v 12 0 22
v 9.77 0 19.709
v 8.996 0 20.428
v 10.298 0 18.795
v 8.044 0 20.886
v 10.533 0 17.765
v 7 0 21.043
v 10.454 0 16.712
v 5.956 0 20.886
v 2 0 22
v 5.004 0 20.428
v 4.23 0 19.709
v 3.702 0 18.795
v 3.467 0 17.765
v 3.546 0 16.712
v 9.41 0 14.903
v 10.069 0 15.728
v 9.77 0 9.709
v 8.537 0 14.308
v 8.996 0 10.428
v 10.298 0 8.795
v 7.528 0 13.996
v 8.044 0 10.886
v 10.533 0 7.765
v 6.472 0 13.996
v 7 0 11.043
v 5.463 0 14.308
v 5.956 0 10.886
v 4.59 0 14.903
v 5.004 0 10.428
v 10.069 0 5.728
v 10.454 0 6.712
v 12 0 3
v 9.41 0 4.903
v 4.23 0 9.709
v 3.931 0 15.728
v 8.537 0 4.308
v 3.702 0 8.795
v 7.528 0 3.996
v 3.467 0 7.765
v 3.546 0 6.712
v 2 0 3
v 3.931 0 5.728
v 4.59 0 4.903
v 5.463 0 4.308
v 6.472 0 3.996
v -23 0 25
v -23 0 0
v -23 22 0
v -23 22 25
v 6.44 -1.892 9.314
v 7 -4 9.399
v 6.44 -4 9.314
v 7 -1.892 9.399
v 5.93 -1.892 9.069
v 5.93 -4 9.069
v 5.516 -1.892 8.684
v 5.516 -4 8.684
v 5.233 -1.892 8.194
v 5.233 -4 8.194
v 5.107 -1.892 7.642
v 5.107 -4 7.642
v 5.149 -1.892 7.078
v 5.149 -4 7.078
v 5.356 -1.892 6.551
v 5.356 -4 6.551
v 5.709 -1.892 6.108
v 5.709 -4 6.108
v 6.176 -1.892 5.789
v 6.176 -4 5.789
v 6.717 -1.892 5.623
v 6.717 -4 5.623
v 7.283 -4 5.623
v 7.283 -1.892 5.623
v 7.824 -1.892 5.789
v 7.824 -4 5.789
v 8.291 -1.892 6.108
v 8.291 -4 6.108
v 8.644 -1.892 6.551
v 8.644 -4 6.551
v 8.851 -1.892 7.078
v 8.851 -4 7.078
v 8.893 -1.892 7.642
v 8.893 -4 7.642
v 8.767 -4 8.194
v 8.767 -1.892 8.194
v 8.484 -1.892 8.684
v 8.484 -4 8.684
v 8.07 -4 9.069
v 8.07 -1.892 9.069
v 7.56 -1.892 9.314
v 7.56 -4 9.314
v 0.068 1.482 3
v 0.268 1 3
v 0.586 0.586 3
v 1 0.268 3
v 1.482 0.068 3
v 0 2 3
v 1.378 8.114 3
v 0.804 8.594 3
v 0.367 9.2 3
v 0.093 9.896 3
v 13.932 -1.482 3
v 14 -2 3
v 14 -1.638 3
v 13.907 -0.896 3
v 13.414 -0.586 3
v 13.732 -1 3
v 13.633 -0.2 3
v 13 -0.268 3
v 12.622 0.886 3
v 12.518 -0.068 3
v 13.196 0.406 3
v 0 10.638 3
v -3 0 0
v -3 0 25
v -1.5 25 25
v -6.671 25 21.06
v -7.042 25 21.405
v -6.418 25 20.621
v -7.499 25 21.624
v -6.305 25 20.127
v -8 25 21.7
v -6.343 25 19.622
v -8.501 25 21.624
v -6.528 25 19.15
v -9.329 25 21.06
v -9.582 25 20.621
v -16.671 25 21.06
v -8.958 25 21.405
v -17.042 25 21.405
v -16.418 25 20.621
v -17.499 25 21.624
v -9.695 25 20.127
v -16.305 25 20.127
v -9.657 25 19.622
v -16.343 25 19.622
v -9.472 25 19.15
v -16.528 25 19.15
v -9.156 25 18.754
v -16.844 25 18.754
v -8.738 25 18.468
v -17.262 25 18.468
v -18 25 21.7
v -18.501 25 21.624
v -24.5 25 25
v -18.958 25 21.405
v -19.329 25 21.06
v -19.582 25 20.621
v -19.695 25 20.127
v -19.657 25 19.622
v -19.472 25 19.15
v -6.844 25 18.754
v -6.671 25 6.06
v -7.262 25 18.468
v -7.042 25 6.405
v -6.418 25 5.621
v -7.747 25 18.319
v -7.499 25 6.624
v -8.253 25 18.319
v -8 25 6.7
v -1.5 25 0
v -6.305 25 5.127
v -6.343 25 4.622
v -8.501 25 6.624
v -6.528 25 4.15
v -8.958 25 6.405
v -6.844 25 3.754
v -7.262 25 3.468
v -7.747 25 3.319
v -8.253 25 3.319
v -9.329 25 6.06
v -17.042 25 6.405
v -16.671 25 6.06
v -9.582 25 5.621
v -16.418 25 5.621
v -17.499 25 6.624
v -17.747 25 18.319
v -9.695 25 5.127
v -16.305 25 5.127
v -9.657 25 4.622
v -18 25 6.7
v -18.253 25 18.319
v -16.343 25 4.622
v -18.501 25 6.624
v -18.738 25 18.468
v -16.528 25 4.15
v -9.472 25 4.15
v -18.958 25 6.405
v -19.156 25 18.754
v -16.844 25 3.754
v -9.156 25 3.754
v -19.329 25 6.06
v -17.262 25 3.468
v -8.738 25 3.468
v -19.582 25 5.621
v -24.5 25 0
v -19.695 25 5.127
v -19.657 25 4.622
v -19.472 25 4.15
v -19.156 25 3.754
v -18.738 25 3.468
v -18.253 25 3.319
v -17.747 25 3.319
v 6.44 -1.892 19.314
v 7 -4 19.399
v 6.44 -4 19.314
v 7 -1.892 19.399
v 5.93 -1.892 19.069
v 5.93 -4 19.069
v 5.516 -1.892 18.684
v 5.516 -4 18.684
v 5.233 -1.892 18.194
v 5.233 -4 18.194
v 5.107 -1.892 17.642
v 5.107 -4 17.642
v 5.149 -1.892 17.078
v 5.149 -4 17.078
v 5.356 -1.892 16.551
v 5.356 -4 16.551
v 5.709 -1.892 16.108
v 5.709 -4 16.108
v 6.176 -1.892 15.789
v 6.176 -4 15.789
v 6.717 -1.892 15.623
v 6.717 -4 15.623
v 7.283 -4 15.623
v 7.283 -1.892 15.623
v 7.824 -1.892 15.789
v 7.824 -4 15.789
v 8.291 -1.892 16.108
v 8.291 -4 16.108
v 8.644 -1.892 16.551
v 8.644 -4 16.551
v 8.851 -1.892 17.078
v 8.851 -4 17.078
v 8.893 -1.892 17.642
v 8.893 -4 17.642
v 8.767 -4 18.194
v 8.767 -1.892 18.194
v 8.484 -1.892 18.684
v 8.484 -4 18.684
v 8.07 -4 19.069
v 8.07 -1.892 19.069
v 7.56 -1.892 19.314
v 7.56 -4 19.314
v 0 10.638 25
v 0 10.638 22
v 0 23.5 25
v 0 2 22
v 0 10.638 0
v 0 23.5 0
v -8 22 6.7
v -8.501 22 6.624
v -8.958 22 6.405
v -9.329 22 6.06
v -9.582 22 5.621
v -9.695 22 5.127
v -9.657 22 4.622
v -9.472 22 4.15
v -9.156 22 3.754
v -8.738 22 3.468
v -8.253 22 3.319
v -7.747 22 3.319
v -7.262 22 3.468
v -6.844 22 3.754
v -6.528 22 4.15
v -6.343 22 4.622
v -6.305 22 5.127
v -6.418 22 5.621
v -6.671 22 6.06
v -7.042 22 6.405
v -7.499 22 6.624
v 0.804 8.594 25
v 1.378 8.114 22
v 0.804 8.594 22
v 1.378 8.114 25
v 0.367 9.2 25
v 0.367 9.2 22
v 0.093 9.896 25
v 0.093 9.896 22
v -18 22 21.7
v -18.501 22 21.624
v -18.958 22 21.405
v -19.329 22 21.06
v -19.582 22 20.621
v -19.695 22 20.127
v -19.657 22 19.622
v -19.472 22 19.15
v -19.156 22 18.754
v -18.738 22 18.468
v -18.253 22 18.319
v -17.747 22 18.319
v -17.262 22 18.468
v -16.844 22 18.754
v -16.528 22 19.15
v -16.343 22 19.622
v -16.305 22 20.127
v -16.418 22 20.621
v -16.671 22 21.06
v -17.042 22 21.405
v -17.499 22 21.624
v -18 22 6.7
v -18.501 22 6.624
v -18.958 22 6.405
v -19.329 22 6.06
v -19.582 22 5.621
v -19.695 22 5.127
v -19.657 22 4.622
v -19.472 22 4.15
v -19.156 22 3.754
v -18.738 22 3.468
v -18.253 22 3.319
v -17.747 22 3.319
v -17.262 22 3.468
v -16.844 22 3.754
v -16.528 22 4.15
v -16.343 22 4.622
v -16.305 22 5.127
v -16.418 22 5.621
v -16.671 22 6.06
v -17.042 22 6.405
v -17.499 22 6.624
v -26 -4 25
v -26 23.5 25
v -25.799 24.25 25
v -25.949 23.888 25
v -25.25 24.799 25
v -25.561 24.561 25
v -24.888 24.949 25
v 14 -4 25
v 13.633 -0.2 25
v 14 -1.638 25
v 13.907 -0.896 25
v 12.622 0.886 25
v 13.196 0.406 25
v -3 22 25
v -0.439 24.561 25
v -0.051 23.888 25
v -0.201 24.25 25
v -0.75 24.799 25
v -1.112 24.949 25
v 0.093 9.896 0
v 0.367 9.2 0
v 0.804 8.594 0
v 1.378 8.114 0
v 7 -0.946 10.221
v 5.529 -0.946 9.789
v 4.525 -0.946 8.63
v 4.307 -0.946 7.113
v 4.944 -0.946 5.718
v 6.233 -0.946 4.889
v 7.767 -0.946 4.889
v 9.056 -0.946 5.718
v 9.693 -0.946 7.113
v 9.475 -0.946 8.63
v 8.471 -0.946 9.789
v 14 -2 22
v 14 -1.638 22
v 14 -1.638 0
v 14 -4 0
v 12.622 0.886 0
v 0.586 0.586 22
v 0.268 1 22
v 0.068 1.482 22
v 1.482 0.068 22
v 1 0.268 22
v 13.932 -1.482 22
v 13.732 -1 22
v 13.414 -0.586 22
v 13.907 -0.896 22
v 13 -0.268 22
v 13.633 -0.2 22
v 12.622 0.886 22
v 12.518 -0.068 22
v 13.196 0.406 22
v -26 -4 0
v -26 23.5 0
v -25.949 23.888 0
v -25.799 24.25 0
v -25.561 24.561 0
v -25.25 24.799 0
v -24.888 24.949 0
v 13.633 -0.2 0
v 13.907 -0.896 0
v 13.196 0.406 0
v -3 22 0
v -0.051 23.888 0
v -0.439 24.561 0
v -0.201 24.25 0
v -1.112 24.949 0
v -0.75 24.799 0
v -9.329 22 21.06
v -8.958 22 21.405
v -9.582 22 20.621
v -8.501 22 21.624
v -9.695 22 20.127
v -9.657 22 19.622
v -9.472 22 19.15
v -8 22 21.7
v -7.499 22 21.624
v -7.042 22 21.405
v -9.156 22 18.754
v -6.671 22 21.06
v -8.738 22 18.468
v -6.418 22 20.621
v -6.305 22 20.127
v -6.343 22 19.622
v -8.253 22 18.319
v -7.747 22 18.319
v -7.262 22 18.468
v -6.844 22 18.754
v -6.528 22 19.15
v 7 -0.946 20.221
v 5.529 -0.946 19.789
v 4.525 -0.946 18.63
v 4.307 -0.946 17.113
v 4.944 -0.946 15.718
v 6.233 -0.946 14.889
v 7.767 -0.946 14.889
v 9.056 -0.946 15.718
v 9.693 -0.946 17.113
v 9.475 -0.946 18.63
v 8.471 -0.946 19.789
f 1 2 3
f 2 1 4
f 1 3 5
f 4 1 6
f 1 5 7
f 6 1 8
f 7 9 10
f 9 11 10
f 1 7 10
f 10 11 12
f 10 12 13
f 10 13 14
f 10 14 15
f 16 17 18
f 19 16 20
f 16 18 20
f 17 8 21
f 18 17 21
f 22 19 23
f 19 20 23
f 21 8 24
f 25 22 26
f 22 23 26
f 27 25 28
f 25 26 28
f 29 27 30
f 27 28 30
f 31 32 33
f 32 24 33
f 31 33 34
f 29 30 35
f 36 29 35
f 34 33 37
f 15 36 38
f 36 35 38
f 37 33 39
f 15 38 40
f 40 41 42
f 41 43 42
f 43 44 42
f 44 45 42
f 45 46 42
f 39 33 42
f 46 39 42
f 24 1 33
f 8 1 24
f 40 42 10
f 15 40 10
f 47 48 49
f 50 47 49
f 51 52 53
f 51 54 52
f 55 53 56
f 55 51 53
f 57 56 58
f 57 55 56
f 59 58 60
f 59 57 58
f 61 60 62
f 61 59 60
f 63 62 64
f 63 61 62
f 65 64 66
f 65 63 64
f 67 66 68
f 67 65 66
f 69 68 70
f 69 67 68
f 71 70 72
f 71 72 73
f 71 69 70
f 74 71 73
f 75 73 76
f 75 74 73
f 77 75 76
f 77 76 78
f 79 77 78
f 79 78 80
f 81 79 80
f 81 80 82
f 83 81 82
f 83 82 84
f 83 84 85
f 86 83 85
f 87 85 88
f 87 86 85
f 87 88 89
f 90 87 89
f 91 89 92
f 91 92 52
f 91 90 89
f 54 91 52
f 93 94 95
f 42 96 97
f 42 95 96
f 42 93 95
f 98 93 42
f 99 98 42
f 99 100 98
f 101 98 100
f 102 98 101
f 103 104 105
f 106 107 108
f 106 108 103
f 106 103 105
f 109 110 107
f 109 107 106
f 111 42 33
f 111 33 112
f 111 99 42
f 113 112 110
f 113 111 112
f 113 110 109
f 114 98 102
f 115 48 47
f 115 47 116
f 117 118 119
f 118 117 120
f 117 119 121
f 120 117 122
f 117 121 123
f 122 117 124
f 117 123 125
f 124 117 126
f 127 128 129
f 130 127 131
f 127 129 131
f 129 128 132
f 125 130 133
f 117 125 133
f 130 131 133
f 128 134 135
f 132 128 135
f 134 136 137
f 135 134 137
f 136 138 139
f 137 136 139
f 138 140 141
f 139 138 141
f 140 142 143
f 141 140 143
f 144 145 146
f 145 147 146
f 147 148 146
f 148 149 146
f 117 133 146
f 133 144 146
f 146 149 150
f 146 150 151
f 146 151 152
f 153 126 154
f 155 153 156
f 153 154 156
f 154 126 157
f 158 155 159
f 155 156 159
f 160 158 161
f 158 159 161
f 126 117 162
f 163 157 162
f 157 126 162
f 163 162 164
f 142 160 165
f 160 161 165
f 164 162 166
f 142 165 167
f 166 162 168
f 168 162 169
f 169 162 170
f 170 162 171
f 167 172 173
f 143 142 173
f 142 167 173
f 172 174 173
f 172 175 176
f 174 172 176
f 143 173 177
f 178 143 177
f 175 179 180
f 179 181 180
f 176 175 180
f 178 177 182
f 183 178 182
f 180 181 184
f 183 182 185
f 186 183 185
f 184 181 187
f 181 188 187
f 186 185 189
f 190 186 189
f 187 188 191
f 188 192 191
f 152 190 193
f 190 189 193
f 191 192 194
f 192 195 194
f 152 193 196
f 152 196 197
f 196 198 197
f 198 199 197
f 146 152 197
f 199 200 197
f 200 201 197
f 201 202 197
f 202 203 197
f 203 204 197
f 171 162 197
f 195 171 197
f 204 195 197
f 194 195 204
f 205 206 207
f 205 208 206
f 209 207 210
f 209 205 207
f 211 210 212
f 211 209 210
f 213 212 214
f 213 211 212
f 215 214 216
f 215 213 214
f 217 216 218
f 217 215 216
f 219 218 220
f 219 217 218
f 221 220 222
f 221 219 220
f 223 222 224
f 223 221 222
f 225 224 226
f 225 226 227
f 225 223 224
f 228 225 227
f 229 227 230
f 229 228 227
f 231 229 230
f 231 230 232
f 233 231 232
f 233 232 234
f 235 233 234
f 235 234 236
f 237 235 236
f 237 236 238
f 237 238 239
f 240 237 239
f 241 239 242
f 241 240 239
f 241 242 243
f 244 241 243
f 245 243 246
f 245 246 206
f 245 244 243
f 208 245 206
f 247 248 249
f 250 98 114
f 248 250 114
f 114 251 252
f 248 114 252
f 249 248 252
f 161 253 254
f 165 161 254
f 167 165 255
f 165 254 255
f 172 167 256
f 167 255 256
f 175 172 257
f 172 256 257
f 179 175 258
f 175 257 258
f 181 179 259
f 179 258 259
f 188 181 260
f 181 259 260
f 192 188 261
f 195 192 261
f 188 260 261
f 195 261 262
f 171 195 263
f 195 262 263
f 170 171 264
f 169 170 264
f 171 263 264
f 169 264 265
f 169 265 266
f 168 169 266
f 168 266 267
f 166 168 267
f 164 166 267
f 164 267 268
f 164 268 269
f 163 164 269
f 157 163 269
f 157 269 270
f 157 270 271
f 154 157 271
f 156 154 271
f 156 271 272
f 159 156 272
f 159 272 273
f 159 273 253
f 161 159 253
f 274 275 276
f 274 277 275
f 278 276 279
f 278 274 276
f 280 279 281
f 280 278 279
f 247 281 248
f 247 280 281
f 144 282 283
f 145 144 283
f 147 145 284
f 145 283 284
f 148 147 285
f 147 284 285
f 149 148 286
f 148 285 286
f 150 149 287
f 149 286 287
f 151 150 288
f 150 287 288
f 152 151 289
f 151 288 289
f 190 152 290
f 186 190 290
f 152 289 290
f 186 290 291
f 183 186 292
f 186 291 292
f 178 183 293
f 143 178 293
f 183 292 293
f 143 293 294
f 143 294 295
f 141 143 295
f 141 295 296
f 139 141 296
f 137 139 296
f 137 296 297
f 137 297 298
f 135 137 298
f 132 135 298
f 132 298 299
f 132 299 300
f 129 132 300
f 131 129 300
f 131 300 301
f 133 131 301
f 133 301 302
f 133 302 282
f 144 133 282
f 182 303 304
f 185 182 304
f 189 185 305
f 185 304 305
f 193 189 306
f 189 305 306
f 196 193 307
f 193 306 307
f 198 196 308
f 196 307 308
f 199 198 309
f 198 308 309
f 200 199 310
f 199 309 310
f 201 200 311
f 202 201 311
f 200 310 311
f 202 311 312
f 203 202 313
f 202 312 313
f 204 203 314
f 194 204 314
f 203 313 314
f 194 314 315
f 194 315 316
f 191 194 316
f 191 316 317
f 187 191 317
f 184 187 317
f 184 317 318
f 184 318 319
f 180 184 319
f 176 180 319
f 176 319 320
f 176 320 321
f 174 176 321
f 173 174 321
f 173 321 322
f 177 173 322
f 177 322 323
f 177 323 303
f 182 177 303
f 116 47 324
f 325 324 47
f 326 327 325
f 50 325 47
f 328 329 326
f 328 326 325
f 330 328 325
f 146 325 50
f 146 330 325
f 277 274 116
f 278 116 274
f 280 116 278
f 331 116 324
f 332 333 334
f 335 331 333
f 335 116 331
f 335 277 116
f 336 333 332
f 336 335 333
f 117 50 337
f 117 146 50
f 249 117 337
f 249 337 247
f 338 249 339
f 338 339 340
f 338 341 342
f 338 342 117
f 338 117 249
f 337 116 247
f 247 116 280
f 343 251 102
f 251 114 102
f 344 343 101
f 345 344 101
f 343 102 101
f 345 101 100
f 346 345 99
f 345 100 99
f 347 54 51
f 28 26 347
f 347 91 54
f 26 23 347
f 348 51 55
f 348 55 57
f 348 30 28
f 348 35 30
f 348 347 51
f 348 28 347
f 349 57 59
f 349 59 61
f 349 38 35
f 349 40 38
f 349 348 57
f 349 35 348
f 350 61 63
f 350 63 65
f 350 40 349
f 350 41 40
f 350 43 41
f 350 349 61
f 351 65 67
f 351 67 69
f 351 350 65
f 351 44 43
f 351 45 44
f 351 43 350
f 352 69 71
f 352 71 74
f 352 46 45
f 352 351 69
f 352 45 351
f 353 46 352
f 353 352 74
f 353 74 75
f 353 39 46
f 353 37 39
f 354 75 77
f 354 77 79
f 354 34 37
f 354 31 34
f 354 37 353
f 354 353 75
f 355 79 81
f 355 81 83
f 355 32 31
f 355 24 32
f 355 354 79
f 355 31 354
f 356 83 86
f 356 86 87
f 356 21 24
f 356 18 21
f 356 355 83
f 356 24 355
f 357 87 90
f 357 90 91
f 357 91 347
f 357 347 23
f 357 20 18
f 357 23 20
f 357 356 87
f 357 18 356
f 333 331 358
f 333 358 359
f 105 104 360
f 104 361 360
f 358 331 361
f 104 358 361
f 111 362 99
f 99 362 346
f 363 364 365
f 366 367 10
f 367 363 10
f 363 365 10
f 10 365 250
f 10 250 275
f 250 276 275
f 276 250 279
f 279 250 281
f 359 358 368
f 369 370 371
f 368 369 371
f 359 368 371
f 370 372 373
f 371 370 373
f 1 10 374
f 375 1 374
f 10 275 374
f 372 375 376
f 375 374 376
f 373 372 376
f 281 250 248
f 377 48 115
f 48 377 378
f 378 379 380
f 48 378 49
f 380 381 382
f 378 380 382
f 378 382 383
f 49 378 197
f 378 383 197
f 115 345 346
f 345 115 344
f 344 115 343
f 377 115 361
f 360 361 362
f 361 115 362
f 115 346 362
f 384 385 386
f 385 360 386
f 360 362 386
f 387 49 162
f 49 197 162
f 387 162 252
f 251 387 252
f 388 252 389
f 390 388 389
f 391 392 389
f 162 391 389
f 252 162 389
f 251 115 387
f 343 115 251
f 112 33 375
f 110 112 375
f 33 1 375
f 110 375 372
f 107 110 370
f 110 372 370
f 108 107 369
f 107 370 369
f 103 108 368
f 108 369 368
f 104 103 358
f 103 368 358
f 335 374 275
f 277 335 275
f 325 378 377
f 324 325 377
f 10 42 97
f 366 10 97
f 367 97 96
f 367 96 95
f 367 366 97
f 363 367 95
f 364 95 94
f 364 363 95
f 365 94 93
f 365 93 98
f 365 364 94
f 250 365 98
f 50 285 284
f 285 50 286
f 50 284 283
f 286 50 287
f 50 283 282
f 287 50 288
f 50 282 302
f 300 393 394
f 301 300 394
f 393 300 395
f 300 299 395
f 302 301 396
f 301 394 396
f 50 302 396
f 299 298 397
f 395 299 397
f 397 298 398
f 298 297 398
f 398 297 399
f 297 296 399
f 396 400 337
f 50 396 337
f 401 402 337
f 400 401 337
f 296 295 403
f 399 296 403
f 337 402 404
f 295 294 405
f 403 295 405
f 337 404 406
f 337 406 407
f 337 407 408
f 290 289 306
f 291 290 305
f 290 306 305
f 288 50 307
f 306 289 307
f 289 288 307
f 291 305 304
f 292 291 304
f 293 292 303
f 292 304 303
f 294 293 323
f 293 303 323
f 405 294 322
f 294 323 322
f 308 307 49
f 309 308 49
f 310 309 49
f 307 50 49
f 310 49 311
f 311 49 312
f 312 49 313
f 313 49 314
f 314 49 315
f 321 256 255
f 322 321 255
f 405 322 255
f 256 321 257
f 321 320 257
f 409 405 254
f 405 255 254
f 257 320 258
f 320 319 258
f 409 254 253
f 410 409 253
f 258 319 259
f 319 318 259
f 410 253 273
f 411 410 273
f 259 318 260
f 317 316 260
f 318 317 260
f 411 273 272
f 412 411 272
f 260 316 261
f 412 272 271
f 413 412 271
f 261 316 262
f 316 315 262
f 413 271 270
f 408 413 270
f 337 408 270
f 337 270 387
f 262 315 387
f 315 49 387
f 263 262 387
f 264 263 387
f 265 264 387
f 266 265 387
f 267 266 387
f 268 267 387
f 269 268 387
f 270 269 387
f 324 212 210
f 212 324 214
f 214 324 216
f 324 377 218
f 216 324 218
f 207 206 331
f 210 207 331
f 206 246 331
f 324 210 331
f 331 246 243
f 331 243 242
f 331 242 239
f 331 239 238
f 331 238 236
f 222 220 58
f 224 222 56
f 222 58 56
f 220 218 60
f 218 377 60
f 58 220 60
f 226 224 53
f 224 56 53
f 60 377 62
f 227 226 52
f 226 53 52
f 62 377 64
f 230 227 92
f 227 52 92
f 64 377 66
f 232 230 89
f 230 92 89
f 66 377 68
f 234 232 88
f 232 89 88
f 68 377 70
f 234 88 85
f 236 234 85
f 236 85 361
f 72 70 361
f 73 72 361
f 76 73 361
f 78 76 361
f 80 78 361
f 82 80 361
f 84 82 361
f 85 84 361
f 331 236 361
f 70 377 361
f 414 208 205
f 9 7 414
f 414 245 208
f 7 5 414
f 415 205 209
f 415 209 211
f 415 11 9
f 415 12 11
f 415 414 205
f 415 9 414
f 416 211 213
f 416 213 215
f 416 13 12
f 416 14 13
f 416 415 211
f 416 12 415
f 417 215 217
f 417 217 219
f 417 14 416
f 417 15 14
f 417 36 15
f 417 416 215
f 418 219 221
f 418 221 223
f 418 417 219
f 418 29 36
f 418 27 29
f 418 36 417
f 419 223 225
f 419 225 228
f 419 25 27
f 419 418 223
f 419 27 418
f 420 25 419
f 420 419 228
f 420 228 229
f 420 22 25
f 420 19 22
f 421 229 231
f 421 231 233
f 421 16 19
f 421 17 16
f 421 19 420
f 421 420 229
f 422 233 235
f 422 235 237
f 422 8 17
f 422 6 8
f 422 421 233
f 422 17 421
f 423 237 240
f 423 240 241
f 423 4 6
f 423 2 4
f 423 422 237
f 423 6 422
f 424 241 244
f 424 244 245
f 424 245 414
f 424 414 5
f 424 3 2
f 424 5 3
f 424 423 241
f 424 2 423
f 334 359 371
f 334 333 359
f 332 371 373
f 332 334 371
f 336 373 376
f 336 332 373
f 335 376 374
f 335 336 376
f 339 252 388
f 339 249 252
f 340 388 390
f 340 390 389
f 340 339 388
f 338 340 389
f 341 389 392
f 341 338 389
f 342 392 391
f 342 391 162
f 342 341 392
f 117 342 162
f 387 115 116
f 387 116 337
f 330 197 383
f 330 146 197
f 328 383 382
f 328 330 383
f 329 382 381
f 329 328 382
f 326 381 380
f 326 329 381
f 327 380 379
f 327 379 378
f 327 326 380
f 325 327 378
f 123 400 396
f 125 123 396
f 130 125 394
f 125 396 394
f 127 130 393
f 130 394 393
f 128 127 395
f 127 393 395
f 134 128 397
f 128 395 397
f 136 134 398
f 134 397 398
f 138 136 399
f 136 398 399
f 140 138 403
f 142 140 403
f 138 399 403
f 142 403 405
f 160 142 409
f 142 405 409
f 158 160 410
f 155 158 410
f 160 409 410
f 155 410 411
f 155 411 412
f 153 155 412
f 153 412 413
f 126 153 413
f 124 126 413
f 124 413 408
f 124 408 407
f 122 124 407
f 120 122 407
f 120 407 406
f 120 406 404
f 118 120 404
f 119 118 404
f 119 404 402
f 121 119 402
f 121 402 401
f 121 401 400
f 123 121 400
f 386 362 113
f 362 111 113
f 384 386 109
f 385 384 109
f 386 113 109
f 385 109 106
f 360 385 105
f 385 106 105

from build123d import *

# Parameters (mm, degrees)
PROFILE_SKETCH_W               = 20
PROFILE_SKETCH_H               = 22
PROFILE_EXTRUDE_DEPTH          = 25
GUSSET_1_EXTRUDE_DEPTH         = 3
GUSSET_START                   = 22
GUSSET_2_EXTRUDE_DEPTH         = 3
SOLENOID_MOUNTING_HOLES_D      = 3.4
SOLENOID_MOUNTING_HOLES_DEPTH  = 3
NO_6_MOUNTING_HOLES_AT_2_COUNT = 2
NO_6_MOUNTING_HOLES_AT_2_PITCH = 10
FILLET3_R                      = 3
FILLET4_R                      = 2
FILLET5_R                      = 3
FILLET6_R                      = 1.5


with BuildPart() as part:
    # Profile Sketch → Profile  Extrude (new body)
    with BuildSketch(Plane.XY):
        Polygon((0, 0), (0, 25), (-26, 25), (-26, -4), (14, -4), (14, 0), align=None)
        with Locations((-13, 11)):
            Rectangle(PROFILE_SKETCH_W, PROFILE_SKETCH_H, mode=Mode.SUBTRACT)
    extrude(amount=PROFILE_EXTRUDE_DEPTH)

    # Gusset Sketch → Gusset 1 Extrude (add)
    with BuildSketch(Plane.XY):
        Polygon((0, 0), (14, 0), (0, 9), align=None)
    extrude(amount=GUSSET_1_EXTRUDE_DEPTH)

    # Gusset Sketch<2> → Gusset 2 Extrude (add)
    with BuildSketch(Plane.XY.offset(GUSSET_START)):
        Polygon((0, 0), (14, 0), (0, 9), align=None)
    extrude(amount=GUSSET_2_EXTRUDE_DEPTH)

    # Solenoid Mounting Holes
    with Locations(Plane(origin=(-25, 25, 0), x_dir=(0, 0, -1), z_dir=(0, 1, 0))):
        with Locations((-5, -17), (-20, -17), (-20, -7), (-5, -7)):
            Hole(SOLENOID_MOUNTING_HOLES_D / 2, depth=SOLENOID_MOUNTING_HOLES_DEPTH)

    # No. 6 Mounting Holes Profile Sketch → No. 6 Mounting Holes (revolve, cut)
    with BuildSketch(Plane(origin=(7, 0, 17.5), x_dir=(0, 0, 1), z_dir=(1, 0, 0))):
        Polygon((0, 0), (0, 4), (1.89865, 4), (1.89865, 1.891953401), (3.5433, 0), align=None)
    no_6_mounting_holes = revolve(axis=Axis((7, 6.35, 17.5), (0, -1, 0)), mode=Mode.SUBTRACT)

    # No. 6 Mounting Holes at 2: No. 6 Mounting Holes ×2
    with Locations(*[(0, 0, -i * NO_6_MOUNTING_HOLES_AT_2_PITCH) for i in range(1, NO_6_MOUNTING_HOLES_AT_2_COUNT)]):
        add(no_6_mounting_holes, mode=Mode.SUBTRACT)

    # Fillet3
    fillet3_edges = [part.edges().sort_by_distance(p)[0] for p in [
        (0, 9, 1.5),
        (0, 9, 23.5),
    ]]
    fillet(fillet3_edges, radius=FILLET3_R)

    # Fillet4
    fillet4_edges = [part.edges().sort_by_distance(p)[0] for p in [
        (14, 0, 12.5),
        (0, 0, 12.5),
    ]]
    fillet(fillet4_edges, radius=FILLET4_R)

    # Fillet5
    fillet5_edges = [part.edges().sort_by_distance(p)[0] for p in [
        (14, 0, 23.5),
        (14, 0, 1.5),
    ]]
    fillet(fillet5_edges, radius=FILLET5_R)

    # Fillet6
    fillet6_edges = [part.edges().sort_by_distance(p)[0] for p in [
        (-26, 25, 12.5),
        (0, 25, 12.5),
    ]]
    fillet(fillet6_edges, radius=FILLET6_R)


solid = part.part
